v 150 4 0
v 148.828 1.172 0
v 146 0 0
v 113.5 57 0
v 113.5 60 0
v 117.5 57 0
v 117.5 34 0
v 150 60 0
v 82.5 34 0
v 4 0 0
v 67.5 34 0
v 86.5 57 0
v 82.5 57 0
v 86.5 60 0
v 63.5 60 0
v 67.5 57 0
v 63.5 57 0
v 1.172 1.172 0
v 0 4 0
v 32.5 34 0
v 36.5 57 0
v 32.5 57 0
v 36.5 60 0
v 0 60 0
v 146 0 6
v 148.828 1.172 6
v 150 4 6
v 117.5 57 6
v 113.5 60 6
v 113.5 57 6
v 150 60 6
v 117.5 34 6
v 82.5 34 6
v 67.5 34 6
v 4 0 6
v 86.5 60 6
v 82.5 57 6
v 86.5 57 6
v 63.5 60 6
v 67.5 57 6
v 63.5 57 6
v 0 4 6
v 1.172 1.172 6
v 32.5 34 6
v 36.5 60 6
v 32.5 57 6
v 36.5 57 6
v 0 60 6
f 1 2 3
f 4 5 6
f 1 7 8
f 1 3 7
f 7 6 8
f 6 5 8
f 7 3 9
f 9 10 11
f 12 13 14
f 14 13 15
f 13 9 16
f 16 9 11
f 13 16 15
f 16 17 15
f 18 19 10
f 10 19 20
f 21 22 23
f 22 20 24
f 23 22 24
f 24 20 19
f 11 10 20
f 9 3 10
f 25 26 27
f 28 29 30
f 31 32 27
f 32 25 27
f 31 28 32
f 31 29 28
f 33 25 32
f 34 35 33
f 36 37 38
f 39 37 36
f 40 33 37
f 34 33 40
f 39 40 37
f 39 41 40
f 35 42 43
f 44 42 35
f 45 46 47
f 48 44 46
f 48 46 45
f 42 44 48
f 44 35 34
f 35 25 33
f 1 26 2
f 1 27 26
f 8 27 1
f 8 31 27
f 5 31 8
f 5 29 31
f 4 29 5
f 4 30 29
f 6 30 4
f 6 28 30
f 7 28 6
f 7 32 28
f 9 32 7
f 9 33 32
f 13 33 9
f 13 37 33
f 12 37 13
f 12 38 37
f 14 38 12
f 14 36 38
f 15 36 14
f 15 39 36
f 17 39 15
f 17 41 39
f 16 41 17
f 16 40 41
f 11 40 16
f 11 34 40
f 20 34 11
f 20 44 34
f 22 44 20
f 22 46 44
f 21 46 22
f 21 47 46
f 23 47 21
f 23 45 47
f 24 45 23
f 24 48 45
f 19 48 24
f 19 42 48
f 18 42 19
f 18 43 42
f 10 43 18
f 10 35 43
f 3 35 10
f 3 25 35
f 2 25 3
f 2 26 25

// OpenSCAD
$fn = 32;

// ----------------------------------------------------------------------
// Oversize slot bar: 150 mm bar with 2 oversize windows
// ----------------------------------------------------------------------

// --- parameters (mm) ---
profile_height = 6;       // extrusion height
profile_points = 24;      // points of the closed outline

profile = [[0, 4], [1.172, 1.172], [4, 0], [146, 0], [148.828, 1.172], [150, 4], [150, 60], [113.5, 60], [113.5, 57], [117.5, 57], [117.5, 34], [82.5, 34], [82.5, 57], [86.5, 57], [86.5, 60], [63.5, 60], [63.5, 57], [67.5, 57], [67.5, 34], [32.5, 34], [32.5, 57], [36.5, 57], [36.5, 60], [0, 60]];  // single closed polygon, 24 points, counter clockwise

// --- the one profile operation ---
linear_extrude(height = profile_height) polygon(points = profile);
